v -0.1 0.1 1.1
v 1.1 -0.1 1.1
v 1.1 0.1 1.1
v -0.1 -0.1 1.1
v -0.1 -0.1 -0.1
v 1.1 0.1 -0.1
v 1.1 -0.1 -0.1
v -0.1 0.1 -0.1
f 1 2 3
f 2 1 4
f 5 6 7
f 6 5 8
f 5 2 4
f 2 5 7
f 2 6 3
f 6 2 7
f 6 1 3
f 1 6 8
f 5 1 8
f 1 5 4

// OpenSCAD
color([0.3, 0.3, 0.5])
translate([-0.1,-0.1,-0.1])
cube([1.2, .2, 1.2], false);
